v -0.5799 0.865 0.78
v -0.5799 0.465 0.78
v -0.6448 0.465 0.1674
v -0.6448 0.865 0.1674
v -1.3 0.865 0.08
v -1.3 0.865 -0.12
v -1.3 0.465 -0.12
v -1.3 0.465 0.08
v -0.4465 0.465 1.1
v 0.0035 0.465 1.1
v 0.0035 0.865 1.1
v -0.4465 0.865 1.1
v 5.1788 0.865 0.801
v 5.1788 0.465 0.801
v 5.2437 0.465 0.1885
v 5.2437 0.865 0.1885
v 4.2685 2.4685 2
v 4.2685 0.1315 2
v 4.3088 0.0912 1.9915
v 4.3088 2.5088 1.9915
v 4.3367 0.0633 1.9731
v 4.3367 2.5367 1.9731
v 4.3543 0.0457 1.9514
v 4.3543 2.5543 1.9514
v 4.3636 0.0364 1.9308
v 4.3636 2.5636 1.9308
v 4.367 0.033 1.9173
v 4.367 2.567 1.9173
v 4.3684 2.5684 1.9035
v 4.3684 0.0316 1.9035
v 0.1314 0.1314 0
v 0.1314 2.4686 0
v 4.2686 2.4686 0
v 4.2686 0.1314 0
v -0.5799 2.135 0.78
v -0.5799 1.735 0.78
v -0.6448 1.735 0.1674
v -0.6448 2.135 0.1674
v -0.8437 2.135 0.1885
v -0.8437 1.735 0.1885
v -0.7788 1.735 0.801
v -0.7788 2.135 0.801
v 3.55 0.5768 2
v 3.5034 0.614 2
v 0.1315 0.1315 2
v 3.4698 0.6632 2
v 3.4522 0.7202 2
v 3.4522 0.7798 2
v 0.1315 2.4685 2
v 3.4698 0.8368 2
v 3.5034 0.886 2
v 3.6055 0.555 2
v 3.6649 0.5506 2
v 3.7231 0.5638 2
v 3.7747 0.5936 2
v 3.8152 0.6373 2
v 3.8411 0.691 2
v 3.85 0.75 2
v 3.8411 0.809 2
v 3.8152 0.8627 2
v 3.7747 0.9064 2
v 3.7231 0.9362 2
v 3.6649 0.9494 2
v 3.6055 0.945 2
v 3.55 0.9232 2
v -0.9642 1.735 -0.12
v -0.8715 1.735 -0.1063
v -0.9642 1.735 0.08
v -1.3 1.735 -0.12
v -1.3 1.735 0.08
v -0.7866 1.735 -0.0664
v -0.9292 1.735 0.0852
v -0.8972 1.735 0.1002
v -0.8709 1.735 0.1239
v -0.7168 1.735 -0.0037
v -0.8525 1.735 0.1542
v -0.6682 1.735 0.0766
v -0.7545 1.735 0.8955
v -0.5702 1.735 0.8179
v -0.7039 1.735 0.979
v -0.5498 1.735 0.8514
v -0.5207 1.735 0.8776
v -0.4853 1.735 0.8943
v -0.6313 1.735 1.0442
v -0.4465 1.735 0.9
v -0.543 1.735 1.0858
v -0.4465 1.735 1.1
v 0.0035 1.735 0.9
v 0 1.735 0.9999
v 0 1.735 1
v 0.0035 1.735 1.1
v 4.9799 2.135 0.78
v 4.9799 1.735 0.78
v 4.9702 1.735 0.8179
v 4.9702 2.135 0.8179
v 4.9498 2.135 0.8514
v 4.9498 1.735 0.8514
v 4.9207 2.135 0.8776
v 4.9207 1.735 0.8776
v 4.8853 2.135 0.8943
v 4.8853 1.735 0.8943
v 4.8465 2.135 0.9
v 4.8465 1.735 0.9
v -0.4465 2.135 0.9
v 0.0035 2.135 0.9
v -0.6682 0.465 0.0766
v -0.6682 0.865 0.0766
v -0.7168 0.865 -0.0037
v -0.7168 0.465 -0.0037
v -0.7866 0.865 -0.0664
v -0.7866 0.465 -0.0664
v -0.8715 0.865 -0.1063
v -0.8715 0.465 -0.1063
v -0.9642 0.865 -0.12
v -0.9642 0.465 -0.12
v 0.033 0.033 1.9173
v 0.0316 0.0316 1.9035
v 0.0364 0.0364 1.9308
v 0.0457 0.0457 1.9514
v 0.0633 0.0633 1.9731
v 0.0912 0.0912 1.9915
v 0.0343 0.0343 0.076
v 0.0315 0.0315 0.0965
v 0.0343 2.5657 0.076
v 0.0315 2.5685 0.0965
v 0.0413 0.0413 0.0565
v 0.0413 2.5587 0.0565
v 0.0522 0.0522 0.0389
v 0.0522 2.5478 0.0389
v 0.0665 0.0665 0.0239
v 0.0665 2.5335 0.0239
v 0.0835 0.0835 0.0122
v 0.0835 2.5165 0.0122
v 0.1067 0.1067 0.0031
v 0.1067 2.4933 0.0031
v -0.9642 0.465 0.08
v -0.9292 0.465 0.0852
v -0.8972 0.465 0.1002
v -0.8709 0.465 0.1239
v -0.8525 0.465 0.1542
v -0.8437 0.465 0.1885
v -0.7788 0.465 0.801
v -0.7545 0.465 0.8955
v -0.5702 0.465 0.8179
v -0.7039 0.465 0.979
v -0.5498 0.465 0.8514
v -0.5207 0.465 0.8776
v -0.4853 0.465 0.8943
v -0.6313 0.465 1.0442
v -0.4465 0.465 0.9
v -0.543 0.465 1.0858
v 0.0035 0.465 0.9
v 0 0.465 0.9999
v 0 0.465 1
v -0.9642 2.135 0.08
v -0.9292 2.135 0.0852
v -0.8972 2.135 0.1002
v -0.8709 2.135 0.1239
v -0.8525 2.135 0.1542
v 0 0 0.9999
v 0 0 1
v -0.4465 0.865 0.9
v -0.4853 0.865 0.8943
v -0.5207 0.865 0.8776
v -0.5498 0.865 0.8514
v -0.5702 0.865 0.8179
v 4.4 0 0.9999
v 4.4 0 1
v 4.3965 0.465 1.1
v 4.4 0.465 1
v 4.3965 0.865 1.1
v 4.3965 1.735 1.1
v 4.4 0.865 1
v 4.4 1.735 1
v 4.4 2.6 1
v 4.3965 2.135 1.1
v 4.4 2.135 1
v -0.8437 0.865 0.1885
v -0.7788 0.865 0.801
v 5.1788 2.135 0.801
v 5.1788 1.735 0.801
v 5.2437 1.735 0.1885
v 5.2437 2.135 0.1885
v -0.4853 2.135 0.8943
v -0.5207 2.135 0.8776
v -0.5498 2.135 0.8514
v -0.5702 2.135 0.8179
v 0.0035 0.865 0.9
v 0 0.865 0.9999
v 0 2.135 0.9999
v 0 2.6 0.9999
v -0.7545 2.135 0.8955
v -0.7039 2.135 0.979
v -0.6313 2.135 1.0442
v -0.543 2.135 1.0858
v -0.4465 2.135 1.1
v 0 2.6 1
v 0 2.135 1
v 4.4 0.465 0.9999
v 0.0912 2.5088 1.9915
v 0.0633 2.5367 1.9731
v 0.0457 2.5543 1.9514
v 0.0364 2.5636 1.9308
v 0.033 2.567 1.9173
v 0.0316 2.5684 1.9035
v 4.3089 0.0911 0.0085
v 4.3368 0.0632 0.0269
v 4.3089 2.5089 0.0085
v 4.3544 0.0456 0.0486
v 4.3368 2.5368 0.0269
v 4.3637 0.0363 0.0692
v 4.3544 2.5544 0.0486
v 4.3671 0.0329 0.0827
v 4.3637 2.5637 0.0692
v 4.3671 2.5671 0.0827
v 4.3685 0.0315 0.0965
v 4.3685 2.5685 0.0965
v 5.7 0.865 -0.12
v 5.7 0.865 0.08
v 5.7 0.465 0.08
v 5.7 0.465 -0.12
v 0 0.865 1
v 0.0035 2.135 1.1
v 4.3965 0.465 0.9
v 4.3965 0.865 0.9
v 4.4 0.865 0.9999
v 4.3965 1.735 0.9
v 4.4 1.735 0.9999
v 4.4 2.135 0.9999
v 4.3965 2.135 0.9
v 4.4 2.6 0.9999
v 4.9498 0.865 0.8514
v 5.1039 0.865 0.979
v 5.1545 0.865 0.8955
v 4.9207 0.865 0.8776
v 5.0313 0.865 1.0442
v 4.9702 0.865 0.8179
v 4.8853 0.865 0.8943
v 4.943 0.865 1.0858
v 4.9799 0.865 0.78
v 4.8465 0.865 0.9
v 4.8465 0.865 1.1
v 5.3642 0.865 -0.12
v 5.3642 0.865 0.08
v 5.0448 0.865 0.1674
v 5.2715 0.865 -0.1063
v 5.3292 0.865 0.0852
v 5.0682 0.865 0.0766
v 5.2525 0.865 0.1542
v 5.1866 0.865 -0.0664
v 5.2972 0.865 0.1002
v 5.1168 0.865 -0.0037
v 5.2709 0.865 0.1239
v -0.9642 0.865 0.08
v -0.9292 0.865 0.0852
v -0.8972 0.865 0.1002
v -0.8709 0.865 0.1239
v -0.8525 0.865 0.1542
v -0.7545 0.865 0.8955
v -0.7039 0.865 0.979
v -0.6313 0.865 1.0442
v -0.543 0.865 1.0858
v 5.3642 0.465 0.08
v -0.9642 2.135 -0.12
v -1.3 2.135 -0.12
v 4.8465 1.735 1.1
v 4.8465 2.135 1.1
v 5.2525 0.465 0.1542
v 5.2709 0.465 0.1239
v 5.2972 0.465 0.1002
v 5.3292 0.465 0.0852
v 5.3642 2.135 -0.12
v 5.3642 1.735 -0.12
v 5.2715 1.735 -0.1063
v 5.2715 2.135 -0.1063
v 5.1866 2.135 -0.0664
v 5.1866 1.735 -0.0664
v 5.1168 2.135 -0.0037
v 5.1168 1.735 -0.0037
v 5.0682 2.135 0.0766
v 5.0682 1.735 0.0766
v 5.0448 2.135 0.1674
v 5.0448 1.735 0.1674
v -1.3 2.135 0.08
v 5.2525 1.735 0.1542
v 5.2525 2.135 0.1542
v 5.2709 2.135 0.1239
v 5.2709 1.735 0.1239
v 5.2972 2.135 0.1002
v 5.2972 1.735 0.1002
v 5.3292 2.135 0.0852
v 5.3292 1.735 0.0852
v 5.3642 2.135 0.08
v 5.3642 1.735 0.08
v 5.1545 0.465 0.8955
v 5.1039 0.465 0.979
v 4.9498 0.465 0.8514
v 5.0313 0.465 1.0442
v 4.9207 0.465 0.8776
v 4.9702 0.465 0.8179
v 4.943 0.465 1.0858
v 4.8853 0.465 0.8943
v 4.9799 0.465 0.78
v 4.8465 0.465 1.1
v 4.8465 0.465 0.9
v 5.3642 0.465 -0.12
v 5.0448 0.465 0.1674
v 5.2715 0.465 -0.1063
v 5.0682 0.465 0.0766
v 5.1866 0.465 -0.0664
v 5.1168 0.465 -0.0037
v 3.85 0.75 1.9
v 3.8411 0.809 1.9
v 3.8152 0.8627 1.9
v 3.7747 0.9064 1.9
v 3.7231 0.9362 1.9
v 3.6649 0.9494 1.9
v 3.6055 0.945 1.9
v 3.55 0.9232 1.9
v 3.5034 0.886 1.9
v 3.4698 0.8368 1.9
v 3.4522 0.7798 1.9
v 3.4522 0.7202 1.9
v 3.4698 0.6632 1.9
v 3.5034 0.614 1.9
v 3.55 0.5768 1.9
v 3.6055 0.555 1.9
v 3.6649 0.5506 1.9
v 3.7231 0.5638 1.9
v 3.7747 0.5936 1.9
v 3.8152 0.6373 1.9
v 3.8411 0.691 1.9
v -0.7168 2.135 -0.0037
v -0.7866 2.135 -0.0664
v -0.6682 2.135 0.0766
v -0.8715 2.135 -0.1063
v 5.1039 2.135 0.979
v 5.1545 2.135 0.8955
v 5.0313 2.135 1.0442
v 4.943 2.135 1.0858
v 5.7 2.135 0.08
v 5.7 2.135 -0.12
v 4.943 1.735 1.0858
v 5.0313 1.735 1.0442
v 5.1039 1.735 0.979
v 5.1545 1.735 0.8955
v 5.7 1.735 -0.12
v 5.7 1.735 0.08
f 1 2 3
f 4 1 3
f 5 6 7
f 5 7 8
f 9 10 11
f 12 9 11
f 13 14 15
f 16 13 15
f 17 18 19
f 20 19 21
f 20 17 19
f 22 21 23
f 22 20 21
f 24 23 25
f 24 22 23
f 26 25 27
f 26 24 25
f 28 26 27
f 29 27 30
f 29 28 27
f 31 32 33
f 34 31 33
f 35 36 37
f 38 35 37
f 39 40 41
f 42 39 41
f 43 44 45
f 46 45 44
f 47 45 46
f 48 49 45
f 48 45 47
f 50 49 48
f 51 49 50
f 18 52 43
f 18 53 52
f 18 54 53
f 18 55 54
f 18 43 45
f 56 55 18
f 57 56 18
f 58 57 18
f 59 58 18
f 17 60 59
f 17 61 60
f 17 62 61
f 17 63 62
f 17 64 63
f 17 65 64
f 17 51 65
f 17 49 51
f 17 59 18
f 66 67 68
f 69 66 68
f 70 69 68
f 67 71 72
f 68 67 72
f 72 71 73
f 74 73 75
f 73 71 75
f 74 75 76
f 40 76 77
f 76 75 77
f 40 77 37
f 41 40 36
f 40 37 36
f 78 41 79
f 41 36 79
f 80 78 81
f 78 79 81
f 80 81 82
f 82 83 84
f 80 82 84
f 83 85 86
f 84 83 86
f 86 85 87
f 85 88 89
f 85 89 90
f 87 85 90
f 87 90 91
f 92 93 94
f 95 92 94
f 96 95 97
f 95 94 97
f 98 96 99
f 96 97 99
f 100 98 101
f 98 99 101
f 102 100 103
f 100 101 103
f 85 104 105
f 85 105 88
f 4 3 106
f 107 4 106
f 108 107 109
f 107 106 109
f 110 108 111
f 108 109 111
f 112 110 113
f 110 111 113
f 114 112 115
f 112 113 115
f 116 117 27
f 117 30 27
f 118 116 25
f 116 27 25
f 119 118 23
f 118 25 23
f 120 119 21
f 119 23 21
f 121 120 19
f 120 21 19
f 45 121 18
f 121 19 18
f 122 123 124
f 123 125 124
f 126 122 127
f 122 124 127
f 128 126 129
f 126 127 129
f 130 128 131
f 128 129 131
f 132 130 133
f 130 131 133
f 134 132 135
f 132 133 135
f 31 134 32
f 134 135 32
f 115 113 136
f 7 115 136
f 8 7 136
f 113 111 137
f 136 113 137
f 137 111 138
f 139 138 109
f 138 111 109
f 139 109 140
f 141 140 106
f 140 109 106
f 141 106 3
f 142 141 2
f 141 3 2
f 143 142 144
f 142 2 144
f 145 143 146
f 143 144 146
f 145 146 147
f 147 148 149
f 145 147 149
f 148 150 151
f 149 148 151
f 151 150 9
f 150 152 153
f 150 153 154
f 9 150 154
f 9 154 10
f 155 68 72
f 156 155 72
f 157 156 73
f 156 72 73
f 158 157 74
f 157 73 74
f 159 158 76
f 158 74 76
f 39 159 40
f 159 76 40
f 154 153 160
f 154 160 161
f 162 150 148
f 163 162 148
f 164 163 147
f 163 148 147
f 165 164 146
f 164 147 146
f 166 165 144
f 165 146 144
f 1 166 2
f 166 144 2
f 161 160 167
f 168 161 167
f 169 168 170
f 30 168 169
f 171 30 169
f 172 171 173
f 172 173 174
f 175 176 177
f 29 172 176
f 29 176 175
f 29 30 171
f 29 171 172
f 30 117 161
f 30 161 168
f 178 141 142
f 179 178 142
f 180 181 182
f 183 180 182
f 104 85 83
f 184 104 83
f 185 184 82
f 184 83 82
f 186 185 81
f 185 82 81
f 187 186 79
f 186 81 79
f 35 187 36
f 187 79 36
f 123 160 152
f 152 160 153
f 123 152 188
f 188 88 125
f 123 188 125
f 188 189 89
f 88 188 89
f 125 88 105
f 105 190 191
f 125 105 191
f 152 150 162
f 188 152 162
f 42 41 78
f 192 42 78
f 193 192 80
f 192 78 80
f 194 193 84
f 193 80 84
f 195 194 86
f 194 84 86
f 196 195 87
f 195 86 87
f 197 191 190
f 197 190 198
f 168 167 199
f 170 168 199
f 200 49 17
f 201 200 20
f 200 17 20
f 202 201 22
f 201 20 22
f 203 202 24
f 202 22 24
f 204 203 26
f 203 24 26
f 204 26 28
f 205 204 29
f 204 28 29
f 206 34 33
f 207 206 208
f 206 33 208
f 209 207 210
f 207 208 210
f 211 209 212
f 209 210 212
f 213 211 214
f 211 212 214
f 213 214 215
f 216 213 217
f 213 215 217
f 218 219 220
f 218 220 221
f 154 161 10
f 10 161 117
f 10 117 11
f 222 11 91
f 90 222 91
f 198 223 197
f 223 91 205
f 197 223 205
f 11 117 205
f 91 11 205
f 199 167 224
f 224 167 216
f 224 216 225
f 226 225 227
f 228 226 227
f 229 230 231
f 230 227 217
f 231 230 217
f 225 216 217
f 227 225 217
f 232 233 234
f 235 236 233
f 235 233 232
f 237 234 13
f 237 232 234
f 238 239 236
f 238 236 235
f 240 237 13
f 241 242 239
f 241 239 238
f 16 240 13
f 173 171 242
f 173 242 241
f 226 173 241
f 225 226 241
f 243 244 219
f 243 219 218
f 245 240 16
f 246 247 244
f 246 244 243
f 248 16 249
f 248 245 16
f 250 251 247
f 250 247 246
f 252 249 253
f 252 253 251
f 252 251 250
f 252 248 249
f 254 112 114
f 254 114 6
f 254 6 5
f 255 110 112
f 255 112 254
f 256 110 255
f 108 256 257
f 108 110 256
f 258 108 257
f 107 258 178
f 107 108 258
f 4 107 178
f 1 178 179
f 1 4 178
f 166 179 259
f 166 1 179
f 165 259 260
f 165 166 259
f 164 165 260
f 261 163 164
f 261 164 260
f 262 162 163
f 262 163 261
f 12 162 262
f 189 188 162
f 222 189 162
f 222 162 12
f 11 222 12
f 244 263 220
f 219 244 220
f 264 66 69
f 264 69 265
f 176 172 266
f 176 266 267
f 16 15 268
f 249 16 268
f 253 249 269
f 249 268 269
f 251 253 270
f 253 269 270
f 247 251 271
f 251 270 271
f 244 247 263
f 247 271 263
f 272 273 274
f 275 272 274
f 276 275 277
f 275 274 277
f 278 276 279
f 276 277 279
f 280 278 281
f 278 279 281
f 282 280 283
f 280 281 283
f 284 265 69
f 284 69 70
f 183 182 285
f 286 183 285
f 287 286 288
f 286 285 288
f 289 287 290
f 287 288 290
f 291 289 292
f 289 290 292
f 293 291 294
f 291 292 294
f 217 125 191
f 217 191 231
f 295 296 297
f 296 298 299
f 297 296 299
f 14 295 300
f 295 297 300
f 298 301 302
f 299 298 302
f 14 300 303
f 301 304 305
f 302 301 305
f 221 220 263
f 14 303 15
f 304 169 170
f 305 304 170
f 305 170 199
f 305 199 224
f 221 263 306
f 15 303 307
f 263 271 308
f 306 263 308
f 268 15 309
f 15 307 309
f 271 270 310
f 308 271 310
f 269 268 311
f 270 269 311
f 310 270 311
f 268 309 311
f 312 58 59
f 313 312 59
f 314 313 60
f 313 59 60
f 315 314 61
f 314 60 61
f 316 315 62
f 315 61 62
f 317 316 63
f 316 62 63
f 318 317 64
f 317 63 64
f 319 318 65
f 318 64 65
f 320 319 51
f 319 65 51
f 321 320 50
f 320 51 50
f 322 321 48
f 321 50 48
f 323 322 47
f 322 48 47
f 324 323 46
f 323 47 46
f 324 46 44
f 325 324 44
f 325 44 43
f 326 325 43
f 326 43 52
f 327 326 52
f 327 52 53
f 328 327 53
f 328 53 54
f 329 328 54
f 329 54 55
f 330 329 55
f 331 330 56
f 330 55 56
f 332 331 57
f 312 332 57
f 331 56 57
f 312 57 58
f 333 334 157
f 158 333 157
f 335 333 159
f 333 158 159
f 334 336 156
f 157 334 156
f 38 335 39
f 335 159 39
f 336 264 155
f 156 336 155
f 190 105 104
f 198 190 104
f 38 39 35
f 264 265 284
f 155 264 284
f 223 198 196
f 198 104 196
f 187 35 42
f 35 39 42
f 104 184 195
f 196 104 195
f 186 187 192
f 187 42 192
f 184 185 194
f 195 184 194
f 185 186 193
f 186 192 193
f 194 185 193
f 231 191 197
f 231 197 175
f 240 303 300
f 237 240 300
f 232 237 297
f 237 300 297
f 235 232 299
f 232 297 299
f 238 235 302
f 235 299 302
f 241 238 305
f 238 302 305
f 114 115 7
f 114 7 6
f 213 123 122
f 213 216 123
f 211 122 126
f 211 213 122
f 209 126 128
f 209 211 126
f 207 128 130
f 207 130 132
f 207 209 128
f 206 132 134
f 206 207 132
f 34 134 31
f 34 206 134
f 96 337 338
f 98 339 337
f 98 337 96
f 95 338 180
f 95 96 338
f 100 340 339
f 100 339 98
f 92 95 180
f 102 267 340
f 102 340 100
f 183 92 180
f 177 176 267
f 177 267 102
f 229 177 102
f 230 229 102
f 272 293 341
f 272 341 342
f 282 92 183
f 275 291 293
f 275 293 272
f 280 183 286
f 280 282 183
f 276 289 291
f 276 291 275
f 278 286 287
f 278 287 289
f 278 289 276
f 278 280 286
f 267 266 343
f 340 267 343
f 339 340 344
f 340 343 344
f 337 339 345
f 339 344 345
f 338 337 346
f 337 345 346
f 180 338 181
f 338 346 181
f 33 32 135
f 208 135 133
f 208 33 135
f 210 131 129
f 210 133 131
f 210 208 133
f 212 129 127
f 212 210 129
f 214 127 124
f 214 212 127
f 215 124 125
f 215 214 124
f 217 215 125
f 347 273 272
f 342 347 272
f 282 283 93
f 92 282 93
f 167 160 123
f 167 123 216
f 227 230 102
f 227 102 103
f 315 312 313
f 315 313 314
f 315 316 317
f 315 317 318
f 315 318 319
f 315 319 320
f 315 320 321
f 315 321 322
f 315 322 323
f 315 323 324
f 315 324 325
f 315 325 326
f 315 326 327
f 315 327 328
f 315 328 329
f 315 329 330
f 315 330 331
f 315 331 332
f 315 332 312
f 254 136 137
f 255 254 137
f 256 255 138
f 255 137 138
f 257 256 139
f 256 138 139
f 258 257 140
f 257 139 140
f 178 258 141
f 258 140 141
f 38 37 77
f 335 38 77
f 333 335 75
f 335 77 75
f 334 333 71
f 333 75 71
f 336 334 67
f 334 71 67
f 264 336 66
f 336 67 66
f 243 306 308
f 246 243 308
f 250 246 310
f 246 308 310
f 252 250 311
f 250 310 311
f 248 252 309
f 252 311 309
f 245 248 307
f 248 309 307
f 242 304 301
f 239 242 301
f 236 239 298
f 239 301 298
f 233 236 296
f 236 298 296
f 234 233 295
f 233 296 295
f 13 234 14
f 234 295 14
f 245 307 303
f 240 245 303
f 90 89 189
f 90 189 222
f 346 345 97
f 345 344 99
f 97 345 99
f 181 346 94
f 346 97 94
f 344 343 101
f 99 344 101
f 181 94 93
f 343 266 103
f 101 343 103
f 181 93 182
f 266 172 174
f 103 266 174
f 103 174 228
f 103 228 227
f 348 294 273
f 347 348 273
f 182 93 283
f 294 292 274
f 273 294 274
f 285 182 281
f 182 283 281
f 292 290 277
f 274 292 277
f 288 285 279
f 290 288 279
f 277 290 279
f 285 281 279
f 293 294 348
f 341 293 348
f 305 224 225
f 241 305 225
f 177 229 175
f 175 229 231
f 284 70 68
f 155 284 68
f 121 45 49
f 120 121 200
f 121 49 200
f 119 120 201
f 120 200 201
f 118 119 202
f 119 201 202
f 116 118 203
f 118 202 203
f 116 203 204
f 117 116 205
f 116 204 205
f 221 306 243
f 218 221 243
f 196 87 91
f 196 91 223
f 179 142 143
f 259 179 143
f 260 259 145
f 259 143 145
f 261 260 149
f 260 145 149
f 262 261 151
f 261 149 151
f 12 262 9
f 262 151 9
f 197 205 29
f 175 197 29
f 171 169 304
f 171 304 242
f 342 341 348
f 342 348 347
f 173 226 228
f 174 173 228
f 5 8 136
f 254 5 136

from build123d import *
from OCP.BRepFilletAPI import BRepFilletAPI_MakeChamfer

# Parameters (mm, degrees)
ESQUISSE1_W             = 4.4
ESQUISSE1_H             = 2.6
BOSS_EXTRU_1_DEPTH      = 2
CHANFREIN1_SIZE         = 1
CHANFREIN1_SIZE2        = 0.034921
CHANFREIN2_SIZE         = 0.034921
CHANFREIN2_SIZE_2       = 1
ESQUISSE2_R             = 0.2
ENL_V_MAT_EXTRU_1_DEPTH = 0.1
ESQUISSE3_W             = 0.3
ESQUISSE3_H             = 0.3
ENL_V_MAT_EXTRU_2_DEPTH = 6.488169
BOSS_EXTRU_2_DEPTH      = 0.000834
BOSS_EXTRU_2_DEPTH_BACK = 4.399166
ESQUISSE4_W             = 0.2
ESQUISSE4_H             = 0.4
ESQUISSE5_W             = 1.22
ESQUISSE5_H             = 0.4
BOSS_EXTRU_3_DEPTH      = 1.3
BOSS_EXTRU_4_OUTLINE_W  = 1.22
BOSS_EXTRU_4_OUTLINE_H  = 0.4
BOSS_EXTRU_4_DEPTH      = 1.3
ENL_V_MAT_EXTRU_3_DEPTH = 7.406889
CONG_1_R                = 0.1
CONG_2_R                = 0.1


with BuildPart() as part:
    # Esquisse1 → Boss.-Extru.1 (new body)
    with BuildSketch(Plane.XY):
        with Locations((2.2, 1.3)):
            Rectangle(ESQUISSE1_W, ESQUISSE1_H)
    extrude(amount=BOSS_EXTRU_1_DEPTH)

    # Chanfrein1: one chamfer whose edges measure the first distance from different faces: ONE call of the kernel's chamfer builder (chamfer() names one face for all edges)
    chanfrein1_edges_1 = [part.edges().sort_by_distance(p)[0] for p in [
        (0, 1.3, 2),
    ]]
    chanfrein1_side_1 = [part.faces().sort_by_distance(p)[0] for p in [
        (0, 1.3, 1),
    ]]
    chanfrein1_edges_2 = [part.edges().sort_by_distance(p)[0] for p in [
        (2.2, 0, 2),
    ]]
    chanfrein1_side_2 = [part.faces().sort_by_distance(p)[0] for p in [
        (2.2, 0, 1),
    ]]
    chanfrein1_edges_3 = [part.edges().sort_by_distance(p)[0] for p in [
        (4.4, 1.3, 2),
    ]]
    chanfrein1_side_3 = [part.faces().sort_by_distance(p)[0] for p in [
        (4.4, 1.3, 1),
    ]]
    chanfrein1_edges_4 = [part.edges().sort_by_distance(p)[0] for p in [
        (2.2, 2.6, 2),
    ]]
    chanfrein1_side_4 = [part.faces().sort_by_distance(p)[0] for p in [
        (2.2, 2.6, 1),
    ]]
    chanfrein1 = BRepFilletAPI_MakeChamfer(part.part.solid().wrapped)
    for e in chanfrein1_edges_1:
        chanfrein1.Add(CHANFREIN1_SIZE, CHANFREIN1_SIZE2, e.wrapped, chanfrein1_side_1[0].wrapped)  # the first distance lies on this face
    for e in chanfrein1_edges_2:
        chanfrein1.Add(CHANFREIN1_SIZE, CHANFREIN1_SIZE2, e.wrapped, chanfrein1_side_2[0].wrapped)  # the first distance lies on this face
    for e in chanfrein1_edges_3:
        chanfrein1.Add(CHANFREIN1_SIZE, CHANFREIN1_SIZE2, e.wrapped, chanfrein1_side_3[0].wrapped)  # the first distance lies on this face
    for e in chanfrein1_edges_4:
        chanfrein1.Add(CHANFREIN1_SIZE, CHANFREIN1_SIZE2, e.wrapped, chanfrein1_side_4[0].wrapped)  # the first distance lies on this face
    add(Compound.cast(chanfrein1.Shape()), mode=Mode.REPLACE)

    # Chanfrein2
    chanfrein2_edges_1 = [part.edges().sort_by_distance(p)[0] for p in [
        (2.2, 0, 0),
    ]]
    chanfrein2_side_1 = [part.faces().sort_by_distance(p)[0] for p in [
        (2.2, 0.000698, 0),
    ]]
    chanfrein2_edges_2 = [part.edges().sort_by_distance(p)[0] for p in [
        (4.4, 1.3, 0),
    ]]
    chanfrein2_side_2 = [part.faces().sort_by_distance(p)[0] for p in [
        (4.4, 1.3, 0.000698),
    ]]
    chanfrein2_edges_3 = [part.edges().sort_by_distance(p)[0] for p in [
        (2.2, 2.6, 0),
    ]]
    chanfrein2_side_3 = [part.faces().sort_by_distance(p)[0] for p in [
        (2.2, 2.6, 0.000698),
    ]]
    chanfrein2_edges_4 = [part.edges().sort_by_distance(p)[0] for p in [
        (0, 1.3, 0),
    ]]
    chanfrein2_side_4 = [part.faces().sort_by_distance(p)[0] for p in [
        (0.000698, 1.3, 0),
    ]]
    chanfrein2 = BRepFilletAPI_MakeChamfer(part.part.solid().wrapped)
    for e in chanfrein2_edges_1:
        chanfrein2.Add(CHANFREIN2_SIZE - 0.0001, CHANFREIN2_SIZE_2 - 0.0001, e.wrapped, chanfrein2_side_1[0].wrapped)
    for e in chanfrein2_edges_2:
        chanfrein2.Add(CHANFREIN2_SIZE_2 - 0.0001, CHANFREIN2_SIZE - 0.0001, e.wrapped, chanfrein2_side_2[0].wrapped)
    for e in chanfrein2_edges_3:
        chanfrein2.Add(CHANFREIN2_SIZE_2 - 0.0001, CHANFREIN2_SIZE - 0.0001, e.wrapped, chanfrein2_side_3[0].wrapped)
    for e in chanfrein2_edges_4:
        chanfrein2.Add(CHANFREIN2_SIZE - 0.0001, CHANFREIN2_SIZE_2 - 0.0001, e.wrapped, chanfrein2_side_4[0].wrapped)
    add(Compound.cast(chanfrein2.Shape()), mode=Mode.REPLACE)  # a hair under: the kernel refuses the full size

    # Esquisse2 → Enlèv. mat.-Extru.1 (cut)
    with BuildSketch(Plane.XY.offset(2)):
        with Locations((3.65, 0.75)):
            Circle(ESQUISSE2_R)
    extrude(amount=-ENL_V_MAT_EXTRU_1_DEPTH, mode=Mode.SUBTRACT)

    # Esquisse3 → Enlèv. mat.-Extru.2 (cut, through all)
    with BuildSketch(Plane.XY.offset(2)):
        with Locations((4.549166, 1.921549)):
            Rectangle(ESQUISSE3_W, ESQUISSE3_H)
        with Locations((-0.149629, 1.921549)):
            Rectangle(ESQUISSE3_W, ESQUISSE3_H)
    extrude(amount=-ENL_V_MAT_EXTRU_2_DEPTH, mode=Mode.SUBTRACT)

    # Esquisse4 → Boss.-Extru.2 (add, two sides: drawn at the far end of the back side and taken through both)
    with BuildSketch(Plane(origin=(4.399166, 0, 0), x_dir=(0, 0, -1), z_dir=(1, 0, 0)).offset(-BOSS_EXTRU_2_DEPTH_BACK)):
        Polygon((-1.1, 2.135), (-1, 2.135), (-0.9, 2.135), (-0.9, 1.735), (-1.1, 1.735), align=None)
        with Locations((-1, 0.665)):
            Rectangle(ESQUISSE4_W, ESQUISSE4_H)
    extrude(amount=BOSS_EXTRU_2_DEPTH + BOSS_EXTRU_2_DEPTH_BACK)

    # Esquisse5 → Boss.-Extru.3 (add)
    with BuildSketch(Plane.ZY):
        with Locations((0.49, 0.665)):
            Rectangle(ESQUISSE5_W, ESQUISSE5_H)
        with Locations((0.49, 1.935)):
            Rectangle(ESQUISSE5_W, ESQUISSE5_H)
    extrude(amount=BOSS_EXTRU_3_DEPTH)

    # Boss.-Extru.4: read off the stored shape, not the designer's step
    # Boss.-Extru.4 outline → Boss.-Extru.4 (add)
    with BuildSketch(Plane(origin=(4.4, 0, 0), x_dir=(0, 0, -1), z_dir=(1, 0, 0))):
        with Locations((-0.49, 1.935)):
            Rectangle(BOSS_EXTRU_4_OUTLINE_W, BOSS_EXTRU_4_OUTLINE_H)
        with Locations((-0.49, 0.665)):
            Rectangle(BOSS_EXTRU_4_OUTLINE_W, BOSS_EXTRU_4_OUTLINE_H)
    extrude(amount=BOSS_EXTRU_4_DEPTH)

    # Esquisse7 → Enlèv. mat.-Extru.3 (cut, through all)
    with BuildSketch(Plane.XZ.offset(-0.465)):
        with BuildLine():
            Line((0, 0.9), (-0.446508, 0.9))
            ThreePointArc((-0.446508, 0.9), (-0.536245, 0.865574), (-0.579932, 0.779961))
            Line((-0.579932, 0.779961), (-0.644812, 0.167386))
            ThreePointArc((-0.644812, 0.167386), (-0.749402, -0.037579), (-0.964243, -0.12))
            Line((-0.964243, -0.12), (0, -0.12))
            Line((0, -0.12), (0, 0.9))
        make_face()
        with BuildLine():
            Line((-1.3, 0.08), (-0.964243, 0.08))
            ThreePointArc((-0.964243, 0.08), (-0.883169, 0.111103), (-0.843699, 0.188451))
            Line((-0.843699, 0.188451), (-0.778819, 0.801026))
            ThreePointArc((-0.778819, 0.801026), (-0.670012, 1.014256), (-0.446508, 1.1))
            Line((-0.446508, 1.1), (-1.3, 1.1))
            Line((-1.3, 1.1), (-1.3, 0.08))
        make_face()
        with BuildLine():
            Line((4.4, -0.12), (5.364243, -0.12))
            ThreePointArc((5.364243, -0.12), (5.149402, -0.037579), (5.044812, 0.167386))
            Line((5.044812, 0.167386), (4.979932, 0.779961))
            ThreePointArc((4.979932, 0.779961), (4.936245, 0.865574), (4.846508, 0.9))
            Line((4.846508, 0.9), (4.4, 0.9))
            Line((4.4, 0.9), (4.4, -0.12))
        make_face()
        with BuildLine():
            Line((5.7, 1.1), (4.846508, 1.1))
            ThreePointArc((4.846508, 1.1), (5.070012, 1.014256), (5.178819, 0.801026))
            Line((5.178819, 0.801026), (5.243699, 0.188451))
            ThreePointArc((5.243699, 0.188451), (5.283169, 0.111103), (5.364243, 0.08))
            Line((5.364243, 0.08), (5.7, 0.08))
            Line((5.7, 0.08), (5.7, 1.1))
        make_face()
    extrude(amount=-ENL_V_MAT_EXTRU_3_DEPTH, mode=Mode.SUBTRACT)

    # Congé1
    cong_1_edges = [part.edges().sort_by_distance(p)[0] for p in [
        (2.2, 2.565079, 2),
        (4.365079, 1.3, 2),
        (0.034921, 1.3, 2),
        (2.2, 0.034921, 2),
    ]]
    fillet(cong_1_edges, radius=CONG_1_R)

    # Congé2
    cong_2_edges = [part.edges().sort_by_distance(p)[0] for p in [
        (0.034821, 1.3, 0),
        (2.2, 2.565179, 0),
        (4.365179, 1.3, 0),
        (2.2, 0.034821, 0),
    ]]
    fillet(cong_2_edges, radius=CONG_2_R)


solid = part.part
